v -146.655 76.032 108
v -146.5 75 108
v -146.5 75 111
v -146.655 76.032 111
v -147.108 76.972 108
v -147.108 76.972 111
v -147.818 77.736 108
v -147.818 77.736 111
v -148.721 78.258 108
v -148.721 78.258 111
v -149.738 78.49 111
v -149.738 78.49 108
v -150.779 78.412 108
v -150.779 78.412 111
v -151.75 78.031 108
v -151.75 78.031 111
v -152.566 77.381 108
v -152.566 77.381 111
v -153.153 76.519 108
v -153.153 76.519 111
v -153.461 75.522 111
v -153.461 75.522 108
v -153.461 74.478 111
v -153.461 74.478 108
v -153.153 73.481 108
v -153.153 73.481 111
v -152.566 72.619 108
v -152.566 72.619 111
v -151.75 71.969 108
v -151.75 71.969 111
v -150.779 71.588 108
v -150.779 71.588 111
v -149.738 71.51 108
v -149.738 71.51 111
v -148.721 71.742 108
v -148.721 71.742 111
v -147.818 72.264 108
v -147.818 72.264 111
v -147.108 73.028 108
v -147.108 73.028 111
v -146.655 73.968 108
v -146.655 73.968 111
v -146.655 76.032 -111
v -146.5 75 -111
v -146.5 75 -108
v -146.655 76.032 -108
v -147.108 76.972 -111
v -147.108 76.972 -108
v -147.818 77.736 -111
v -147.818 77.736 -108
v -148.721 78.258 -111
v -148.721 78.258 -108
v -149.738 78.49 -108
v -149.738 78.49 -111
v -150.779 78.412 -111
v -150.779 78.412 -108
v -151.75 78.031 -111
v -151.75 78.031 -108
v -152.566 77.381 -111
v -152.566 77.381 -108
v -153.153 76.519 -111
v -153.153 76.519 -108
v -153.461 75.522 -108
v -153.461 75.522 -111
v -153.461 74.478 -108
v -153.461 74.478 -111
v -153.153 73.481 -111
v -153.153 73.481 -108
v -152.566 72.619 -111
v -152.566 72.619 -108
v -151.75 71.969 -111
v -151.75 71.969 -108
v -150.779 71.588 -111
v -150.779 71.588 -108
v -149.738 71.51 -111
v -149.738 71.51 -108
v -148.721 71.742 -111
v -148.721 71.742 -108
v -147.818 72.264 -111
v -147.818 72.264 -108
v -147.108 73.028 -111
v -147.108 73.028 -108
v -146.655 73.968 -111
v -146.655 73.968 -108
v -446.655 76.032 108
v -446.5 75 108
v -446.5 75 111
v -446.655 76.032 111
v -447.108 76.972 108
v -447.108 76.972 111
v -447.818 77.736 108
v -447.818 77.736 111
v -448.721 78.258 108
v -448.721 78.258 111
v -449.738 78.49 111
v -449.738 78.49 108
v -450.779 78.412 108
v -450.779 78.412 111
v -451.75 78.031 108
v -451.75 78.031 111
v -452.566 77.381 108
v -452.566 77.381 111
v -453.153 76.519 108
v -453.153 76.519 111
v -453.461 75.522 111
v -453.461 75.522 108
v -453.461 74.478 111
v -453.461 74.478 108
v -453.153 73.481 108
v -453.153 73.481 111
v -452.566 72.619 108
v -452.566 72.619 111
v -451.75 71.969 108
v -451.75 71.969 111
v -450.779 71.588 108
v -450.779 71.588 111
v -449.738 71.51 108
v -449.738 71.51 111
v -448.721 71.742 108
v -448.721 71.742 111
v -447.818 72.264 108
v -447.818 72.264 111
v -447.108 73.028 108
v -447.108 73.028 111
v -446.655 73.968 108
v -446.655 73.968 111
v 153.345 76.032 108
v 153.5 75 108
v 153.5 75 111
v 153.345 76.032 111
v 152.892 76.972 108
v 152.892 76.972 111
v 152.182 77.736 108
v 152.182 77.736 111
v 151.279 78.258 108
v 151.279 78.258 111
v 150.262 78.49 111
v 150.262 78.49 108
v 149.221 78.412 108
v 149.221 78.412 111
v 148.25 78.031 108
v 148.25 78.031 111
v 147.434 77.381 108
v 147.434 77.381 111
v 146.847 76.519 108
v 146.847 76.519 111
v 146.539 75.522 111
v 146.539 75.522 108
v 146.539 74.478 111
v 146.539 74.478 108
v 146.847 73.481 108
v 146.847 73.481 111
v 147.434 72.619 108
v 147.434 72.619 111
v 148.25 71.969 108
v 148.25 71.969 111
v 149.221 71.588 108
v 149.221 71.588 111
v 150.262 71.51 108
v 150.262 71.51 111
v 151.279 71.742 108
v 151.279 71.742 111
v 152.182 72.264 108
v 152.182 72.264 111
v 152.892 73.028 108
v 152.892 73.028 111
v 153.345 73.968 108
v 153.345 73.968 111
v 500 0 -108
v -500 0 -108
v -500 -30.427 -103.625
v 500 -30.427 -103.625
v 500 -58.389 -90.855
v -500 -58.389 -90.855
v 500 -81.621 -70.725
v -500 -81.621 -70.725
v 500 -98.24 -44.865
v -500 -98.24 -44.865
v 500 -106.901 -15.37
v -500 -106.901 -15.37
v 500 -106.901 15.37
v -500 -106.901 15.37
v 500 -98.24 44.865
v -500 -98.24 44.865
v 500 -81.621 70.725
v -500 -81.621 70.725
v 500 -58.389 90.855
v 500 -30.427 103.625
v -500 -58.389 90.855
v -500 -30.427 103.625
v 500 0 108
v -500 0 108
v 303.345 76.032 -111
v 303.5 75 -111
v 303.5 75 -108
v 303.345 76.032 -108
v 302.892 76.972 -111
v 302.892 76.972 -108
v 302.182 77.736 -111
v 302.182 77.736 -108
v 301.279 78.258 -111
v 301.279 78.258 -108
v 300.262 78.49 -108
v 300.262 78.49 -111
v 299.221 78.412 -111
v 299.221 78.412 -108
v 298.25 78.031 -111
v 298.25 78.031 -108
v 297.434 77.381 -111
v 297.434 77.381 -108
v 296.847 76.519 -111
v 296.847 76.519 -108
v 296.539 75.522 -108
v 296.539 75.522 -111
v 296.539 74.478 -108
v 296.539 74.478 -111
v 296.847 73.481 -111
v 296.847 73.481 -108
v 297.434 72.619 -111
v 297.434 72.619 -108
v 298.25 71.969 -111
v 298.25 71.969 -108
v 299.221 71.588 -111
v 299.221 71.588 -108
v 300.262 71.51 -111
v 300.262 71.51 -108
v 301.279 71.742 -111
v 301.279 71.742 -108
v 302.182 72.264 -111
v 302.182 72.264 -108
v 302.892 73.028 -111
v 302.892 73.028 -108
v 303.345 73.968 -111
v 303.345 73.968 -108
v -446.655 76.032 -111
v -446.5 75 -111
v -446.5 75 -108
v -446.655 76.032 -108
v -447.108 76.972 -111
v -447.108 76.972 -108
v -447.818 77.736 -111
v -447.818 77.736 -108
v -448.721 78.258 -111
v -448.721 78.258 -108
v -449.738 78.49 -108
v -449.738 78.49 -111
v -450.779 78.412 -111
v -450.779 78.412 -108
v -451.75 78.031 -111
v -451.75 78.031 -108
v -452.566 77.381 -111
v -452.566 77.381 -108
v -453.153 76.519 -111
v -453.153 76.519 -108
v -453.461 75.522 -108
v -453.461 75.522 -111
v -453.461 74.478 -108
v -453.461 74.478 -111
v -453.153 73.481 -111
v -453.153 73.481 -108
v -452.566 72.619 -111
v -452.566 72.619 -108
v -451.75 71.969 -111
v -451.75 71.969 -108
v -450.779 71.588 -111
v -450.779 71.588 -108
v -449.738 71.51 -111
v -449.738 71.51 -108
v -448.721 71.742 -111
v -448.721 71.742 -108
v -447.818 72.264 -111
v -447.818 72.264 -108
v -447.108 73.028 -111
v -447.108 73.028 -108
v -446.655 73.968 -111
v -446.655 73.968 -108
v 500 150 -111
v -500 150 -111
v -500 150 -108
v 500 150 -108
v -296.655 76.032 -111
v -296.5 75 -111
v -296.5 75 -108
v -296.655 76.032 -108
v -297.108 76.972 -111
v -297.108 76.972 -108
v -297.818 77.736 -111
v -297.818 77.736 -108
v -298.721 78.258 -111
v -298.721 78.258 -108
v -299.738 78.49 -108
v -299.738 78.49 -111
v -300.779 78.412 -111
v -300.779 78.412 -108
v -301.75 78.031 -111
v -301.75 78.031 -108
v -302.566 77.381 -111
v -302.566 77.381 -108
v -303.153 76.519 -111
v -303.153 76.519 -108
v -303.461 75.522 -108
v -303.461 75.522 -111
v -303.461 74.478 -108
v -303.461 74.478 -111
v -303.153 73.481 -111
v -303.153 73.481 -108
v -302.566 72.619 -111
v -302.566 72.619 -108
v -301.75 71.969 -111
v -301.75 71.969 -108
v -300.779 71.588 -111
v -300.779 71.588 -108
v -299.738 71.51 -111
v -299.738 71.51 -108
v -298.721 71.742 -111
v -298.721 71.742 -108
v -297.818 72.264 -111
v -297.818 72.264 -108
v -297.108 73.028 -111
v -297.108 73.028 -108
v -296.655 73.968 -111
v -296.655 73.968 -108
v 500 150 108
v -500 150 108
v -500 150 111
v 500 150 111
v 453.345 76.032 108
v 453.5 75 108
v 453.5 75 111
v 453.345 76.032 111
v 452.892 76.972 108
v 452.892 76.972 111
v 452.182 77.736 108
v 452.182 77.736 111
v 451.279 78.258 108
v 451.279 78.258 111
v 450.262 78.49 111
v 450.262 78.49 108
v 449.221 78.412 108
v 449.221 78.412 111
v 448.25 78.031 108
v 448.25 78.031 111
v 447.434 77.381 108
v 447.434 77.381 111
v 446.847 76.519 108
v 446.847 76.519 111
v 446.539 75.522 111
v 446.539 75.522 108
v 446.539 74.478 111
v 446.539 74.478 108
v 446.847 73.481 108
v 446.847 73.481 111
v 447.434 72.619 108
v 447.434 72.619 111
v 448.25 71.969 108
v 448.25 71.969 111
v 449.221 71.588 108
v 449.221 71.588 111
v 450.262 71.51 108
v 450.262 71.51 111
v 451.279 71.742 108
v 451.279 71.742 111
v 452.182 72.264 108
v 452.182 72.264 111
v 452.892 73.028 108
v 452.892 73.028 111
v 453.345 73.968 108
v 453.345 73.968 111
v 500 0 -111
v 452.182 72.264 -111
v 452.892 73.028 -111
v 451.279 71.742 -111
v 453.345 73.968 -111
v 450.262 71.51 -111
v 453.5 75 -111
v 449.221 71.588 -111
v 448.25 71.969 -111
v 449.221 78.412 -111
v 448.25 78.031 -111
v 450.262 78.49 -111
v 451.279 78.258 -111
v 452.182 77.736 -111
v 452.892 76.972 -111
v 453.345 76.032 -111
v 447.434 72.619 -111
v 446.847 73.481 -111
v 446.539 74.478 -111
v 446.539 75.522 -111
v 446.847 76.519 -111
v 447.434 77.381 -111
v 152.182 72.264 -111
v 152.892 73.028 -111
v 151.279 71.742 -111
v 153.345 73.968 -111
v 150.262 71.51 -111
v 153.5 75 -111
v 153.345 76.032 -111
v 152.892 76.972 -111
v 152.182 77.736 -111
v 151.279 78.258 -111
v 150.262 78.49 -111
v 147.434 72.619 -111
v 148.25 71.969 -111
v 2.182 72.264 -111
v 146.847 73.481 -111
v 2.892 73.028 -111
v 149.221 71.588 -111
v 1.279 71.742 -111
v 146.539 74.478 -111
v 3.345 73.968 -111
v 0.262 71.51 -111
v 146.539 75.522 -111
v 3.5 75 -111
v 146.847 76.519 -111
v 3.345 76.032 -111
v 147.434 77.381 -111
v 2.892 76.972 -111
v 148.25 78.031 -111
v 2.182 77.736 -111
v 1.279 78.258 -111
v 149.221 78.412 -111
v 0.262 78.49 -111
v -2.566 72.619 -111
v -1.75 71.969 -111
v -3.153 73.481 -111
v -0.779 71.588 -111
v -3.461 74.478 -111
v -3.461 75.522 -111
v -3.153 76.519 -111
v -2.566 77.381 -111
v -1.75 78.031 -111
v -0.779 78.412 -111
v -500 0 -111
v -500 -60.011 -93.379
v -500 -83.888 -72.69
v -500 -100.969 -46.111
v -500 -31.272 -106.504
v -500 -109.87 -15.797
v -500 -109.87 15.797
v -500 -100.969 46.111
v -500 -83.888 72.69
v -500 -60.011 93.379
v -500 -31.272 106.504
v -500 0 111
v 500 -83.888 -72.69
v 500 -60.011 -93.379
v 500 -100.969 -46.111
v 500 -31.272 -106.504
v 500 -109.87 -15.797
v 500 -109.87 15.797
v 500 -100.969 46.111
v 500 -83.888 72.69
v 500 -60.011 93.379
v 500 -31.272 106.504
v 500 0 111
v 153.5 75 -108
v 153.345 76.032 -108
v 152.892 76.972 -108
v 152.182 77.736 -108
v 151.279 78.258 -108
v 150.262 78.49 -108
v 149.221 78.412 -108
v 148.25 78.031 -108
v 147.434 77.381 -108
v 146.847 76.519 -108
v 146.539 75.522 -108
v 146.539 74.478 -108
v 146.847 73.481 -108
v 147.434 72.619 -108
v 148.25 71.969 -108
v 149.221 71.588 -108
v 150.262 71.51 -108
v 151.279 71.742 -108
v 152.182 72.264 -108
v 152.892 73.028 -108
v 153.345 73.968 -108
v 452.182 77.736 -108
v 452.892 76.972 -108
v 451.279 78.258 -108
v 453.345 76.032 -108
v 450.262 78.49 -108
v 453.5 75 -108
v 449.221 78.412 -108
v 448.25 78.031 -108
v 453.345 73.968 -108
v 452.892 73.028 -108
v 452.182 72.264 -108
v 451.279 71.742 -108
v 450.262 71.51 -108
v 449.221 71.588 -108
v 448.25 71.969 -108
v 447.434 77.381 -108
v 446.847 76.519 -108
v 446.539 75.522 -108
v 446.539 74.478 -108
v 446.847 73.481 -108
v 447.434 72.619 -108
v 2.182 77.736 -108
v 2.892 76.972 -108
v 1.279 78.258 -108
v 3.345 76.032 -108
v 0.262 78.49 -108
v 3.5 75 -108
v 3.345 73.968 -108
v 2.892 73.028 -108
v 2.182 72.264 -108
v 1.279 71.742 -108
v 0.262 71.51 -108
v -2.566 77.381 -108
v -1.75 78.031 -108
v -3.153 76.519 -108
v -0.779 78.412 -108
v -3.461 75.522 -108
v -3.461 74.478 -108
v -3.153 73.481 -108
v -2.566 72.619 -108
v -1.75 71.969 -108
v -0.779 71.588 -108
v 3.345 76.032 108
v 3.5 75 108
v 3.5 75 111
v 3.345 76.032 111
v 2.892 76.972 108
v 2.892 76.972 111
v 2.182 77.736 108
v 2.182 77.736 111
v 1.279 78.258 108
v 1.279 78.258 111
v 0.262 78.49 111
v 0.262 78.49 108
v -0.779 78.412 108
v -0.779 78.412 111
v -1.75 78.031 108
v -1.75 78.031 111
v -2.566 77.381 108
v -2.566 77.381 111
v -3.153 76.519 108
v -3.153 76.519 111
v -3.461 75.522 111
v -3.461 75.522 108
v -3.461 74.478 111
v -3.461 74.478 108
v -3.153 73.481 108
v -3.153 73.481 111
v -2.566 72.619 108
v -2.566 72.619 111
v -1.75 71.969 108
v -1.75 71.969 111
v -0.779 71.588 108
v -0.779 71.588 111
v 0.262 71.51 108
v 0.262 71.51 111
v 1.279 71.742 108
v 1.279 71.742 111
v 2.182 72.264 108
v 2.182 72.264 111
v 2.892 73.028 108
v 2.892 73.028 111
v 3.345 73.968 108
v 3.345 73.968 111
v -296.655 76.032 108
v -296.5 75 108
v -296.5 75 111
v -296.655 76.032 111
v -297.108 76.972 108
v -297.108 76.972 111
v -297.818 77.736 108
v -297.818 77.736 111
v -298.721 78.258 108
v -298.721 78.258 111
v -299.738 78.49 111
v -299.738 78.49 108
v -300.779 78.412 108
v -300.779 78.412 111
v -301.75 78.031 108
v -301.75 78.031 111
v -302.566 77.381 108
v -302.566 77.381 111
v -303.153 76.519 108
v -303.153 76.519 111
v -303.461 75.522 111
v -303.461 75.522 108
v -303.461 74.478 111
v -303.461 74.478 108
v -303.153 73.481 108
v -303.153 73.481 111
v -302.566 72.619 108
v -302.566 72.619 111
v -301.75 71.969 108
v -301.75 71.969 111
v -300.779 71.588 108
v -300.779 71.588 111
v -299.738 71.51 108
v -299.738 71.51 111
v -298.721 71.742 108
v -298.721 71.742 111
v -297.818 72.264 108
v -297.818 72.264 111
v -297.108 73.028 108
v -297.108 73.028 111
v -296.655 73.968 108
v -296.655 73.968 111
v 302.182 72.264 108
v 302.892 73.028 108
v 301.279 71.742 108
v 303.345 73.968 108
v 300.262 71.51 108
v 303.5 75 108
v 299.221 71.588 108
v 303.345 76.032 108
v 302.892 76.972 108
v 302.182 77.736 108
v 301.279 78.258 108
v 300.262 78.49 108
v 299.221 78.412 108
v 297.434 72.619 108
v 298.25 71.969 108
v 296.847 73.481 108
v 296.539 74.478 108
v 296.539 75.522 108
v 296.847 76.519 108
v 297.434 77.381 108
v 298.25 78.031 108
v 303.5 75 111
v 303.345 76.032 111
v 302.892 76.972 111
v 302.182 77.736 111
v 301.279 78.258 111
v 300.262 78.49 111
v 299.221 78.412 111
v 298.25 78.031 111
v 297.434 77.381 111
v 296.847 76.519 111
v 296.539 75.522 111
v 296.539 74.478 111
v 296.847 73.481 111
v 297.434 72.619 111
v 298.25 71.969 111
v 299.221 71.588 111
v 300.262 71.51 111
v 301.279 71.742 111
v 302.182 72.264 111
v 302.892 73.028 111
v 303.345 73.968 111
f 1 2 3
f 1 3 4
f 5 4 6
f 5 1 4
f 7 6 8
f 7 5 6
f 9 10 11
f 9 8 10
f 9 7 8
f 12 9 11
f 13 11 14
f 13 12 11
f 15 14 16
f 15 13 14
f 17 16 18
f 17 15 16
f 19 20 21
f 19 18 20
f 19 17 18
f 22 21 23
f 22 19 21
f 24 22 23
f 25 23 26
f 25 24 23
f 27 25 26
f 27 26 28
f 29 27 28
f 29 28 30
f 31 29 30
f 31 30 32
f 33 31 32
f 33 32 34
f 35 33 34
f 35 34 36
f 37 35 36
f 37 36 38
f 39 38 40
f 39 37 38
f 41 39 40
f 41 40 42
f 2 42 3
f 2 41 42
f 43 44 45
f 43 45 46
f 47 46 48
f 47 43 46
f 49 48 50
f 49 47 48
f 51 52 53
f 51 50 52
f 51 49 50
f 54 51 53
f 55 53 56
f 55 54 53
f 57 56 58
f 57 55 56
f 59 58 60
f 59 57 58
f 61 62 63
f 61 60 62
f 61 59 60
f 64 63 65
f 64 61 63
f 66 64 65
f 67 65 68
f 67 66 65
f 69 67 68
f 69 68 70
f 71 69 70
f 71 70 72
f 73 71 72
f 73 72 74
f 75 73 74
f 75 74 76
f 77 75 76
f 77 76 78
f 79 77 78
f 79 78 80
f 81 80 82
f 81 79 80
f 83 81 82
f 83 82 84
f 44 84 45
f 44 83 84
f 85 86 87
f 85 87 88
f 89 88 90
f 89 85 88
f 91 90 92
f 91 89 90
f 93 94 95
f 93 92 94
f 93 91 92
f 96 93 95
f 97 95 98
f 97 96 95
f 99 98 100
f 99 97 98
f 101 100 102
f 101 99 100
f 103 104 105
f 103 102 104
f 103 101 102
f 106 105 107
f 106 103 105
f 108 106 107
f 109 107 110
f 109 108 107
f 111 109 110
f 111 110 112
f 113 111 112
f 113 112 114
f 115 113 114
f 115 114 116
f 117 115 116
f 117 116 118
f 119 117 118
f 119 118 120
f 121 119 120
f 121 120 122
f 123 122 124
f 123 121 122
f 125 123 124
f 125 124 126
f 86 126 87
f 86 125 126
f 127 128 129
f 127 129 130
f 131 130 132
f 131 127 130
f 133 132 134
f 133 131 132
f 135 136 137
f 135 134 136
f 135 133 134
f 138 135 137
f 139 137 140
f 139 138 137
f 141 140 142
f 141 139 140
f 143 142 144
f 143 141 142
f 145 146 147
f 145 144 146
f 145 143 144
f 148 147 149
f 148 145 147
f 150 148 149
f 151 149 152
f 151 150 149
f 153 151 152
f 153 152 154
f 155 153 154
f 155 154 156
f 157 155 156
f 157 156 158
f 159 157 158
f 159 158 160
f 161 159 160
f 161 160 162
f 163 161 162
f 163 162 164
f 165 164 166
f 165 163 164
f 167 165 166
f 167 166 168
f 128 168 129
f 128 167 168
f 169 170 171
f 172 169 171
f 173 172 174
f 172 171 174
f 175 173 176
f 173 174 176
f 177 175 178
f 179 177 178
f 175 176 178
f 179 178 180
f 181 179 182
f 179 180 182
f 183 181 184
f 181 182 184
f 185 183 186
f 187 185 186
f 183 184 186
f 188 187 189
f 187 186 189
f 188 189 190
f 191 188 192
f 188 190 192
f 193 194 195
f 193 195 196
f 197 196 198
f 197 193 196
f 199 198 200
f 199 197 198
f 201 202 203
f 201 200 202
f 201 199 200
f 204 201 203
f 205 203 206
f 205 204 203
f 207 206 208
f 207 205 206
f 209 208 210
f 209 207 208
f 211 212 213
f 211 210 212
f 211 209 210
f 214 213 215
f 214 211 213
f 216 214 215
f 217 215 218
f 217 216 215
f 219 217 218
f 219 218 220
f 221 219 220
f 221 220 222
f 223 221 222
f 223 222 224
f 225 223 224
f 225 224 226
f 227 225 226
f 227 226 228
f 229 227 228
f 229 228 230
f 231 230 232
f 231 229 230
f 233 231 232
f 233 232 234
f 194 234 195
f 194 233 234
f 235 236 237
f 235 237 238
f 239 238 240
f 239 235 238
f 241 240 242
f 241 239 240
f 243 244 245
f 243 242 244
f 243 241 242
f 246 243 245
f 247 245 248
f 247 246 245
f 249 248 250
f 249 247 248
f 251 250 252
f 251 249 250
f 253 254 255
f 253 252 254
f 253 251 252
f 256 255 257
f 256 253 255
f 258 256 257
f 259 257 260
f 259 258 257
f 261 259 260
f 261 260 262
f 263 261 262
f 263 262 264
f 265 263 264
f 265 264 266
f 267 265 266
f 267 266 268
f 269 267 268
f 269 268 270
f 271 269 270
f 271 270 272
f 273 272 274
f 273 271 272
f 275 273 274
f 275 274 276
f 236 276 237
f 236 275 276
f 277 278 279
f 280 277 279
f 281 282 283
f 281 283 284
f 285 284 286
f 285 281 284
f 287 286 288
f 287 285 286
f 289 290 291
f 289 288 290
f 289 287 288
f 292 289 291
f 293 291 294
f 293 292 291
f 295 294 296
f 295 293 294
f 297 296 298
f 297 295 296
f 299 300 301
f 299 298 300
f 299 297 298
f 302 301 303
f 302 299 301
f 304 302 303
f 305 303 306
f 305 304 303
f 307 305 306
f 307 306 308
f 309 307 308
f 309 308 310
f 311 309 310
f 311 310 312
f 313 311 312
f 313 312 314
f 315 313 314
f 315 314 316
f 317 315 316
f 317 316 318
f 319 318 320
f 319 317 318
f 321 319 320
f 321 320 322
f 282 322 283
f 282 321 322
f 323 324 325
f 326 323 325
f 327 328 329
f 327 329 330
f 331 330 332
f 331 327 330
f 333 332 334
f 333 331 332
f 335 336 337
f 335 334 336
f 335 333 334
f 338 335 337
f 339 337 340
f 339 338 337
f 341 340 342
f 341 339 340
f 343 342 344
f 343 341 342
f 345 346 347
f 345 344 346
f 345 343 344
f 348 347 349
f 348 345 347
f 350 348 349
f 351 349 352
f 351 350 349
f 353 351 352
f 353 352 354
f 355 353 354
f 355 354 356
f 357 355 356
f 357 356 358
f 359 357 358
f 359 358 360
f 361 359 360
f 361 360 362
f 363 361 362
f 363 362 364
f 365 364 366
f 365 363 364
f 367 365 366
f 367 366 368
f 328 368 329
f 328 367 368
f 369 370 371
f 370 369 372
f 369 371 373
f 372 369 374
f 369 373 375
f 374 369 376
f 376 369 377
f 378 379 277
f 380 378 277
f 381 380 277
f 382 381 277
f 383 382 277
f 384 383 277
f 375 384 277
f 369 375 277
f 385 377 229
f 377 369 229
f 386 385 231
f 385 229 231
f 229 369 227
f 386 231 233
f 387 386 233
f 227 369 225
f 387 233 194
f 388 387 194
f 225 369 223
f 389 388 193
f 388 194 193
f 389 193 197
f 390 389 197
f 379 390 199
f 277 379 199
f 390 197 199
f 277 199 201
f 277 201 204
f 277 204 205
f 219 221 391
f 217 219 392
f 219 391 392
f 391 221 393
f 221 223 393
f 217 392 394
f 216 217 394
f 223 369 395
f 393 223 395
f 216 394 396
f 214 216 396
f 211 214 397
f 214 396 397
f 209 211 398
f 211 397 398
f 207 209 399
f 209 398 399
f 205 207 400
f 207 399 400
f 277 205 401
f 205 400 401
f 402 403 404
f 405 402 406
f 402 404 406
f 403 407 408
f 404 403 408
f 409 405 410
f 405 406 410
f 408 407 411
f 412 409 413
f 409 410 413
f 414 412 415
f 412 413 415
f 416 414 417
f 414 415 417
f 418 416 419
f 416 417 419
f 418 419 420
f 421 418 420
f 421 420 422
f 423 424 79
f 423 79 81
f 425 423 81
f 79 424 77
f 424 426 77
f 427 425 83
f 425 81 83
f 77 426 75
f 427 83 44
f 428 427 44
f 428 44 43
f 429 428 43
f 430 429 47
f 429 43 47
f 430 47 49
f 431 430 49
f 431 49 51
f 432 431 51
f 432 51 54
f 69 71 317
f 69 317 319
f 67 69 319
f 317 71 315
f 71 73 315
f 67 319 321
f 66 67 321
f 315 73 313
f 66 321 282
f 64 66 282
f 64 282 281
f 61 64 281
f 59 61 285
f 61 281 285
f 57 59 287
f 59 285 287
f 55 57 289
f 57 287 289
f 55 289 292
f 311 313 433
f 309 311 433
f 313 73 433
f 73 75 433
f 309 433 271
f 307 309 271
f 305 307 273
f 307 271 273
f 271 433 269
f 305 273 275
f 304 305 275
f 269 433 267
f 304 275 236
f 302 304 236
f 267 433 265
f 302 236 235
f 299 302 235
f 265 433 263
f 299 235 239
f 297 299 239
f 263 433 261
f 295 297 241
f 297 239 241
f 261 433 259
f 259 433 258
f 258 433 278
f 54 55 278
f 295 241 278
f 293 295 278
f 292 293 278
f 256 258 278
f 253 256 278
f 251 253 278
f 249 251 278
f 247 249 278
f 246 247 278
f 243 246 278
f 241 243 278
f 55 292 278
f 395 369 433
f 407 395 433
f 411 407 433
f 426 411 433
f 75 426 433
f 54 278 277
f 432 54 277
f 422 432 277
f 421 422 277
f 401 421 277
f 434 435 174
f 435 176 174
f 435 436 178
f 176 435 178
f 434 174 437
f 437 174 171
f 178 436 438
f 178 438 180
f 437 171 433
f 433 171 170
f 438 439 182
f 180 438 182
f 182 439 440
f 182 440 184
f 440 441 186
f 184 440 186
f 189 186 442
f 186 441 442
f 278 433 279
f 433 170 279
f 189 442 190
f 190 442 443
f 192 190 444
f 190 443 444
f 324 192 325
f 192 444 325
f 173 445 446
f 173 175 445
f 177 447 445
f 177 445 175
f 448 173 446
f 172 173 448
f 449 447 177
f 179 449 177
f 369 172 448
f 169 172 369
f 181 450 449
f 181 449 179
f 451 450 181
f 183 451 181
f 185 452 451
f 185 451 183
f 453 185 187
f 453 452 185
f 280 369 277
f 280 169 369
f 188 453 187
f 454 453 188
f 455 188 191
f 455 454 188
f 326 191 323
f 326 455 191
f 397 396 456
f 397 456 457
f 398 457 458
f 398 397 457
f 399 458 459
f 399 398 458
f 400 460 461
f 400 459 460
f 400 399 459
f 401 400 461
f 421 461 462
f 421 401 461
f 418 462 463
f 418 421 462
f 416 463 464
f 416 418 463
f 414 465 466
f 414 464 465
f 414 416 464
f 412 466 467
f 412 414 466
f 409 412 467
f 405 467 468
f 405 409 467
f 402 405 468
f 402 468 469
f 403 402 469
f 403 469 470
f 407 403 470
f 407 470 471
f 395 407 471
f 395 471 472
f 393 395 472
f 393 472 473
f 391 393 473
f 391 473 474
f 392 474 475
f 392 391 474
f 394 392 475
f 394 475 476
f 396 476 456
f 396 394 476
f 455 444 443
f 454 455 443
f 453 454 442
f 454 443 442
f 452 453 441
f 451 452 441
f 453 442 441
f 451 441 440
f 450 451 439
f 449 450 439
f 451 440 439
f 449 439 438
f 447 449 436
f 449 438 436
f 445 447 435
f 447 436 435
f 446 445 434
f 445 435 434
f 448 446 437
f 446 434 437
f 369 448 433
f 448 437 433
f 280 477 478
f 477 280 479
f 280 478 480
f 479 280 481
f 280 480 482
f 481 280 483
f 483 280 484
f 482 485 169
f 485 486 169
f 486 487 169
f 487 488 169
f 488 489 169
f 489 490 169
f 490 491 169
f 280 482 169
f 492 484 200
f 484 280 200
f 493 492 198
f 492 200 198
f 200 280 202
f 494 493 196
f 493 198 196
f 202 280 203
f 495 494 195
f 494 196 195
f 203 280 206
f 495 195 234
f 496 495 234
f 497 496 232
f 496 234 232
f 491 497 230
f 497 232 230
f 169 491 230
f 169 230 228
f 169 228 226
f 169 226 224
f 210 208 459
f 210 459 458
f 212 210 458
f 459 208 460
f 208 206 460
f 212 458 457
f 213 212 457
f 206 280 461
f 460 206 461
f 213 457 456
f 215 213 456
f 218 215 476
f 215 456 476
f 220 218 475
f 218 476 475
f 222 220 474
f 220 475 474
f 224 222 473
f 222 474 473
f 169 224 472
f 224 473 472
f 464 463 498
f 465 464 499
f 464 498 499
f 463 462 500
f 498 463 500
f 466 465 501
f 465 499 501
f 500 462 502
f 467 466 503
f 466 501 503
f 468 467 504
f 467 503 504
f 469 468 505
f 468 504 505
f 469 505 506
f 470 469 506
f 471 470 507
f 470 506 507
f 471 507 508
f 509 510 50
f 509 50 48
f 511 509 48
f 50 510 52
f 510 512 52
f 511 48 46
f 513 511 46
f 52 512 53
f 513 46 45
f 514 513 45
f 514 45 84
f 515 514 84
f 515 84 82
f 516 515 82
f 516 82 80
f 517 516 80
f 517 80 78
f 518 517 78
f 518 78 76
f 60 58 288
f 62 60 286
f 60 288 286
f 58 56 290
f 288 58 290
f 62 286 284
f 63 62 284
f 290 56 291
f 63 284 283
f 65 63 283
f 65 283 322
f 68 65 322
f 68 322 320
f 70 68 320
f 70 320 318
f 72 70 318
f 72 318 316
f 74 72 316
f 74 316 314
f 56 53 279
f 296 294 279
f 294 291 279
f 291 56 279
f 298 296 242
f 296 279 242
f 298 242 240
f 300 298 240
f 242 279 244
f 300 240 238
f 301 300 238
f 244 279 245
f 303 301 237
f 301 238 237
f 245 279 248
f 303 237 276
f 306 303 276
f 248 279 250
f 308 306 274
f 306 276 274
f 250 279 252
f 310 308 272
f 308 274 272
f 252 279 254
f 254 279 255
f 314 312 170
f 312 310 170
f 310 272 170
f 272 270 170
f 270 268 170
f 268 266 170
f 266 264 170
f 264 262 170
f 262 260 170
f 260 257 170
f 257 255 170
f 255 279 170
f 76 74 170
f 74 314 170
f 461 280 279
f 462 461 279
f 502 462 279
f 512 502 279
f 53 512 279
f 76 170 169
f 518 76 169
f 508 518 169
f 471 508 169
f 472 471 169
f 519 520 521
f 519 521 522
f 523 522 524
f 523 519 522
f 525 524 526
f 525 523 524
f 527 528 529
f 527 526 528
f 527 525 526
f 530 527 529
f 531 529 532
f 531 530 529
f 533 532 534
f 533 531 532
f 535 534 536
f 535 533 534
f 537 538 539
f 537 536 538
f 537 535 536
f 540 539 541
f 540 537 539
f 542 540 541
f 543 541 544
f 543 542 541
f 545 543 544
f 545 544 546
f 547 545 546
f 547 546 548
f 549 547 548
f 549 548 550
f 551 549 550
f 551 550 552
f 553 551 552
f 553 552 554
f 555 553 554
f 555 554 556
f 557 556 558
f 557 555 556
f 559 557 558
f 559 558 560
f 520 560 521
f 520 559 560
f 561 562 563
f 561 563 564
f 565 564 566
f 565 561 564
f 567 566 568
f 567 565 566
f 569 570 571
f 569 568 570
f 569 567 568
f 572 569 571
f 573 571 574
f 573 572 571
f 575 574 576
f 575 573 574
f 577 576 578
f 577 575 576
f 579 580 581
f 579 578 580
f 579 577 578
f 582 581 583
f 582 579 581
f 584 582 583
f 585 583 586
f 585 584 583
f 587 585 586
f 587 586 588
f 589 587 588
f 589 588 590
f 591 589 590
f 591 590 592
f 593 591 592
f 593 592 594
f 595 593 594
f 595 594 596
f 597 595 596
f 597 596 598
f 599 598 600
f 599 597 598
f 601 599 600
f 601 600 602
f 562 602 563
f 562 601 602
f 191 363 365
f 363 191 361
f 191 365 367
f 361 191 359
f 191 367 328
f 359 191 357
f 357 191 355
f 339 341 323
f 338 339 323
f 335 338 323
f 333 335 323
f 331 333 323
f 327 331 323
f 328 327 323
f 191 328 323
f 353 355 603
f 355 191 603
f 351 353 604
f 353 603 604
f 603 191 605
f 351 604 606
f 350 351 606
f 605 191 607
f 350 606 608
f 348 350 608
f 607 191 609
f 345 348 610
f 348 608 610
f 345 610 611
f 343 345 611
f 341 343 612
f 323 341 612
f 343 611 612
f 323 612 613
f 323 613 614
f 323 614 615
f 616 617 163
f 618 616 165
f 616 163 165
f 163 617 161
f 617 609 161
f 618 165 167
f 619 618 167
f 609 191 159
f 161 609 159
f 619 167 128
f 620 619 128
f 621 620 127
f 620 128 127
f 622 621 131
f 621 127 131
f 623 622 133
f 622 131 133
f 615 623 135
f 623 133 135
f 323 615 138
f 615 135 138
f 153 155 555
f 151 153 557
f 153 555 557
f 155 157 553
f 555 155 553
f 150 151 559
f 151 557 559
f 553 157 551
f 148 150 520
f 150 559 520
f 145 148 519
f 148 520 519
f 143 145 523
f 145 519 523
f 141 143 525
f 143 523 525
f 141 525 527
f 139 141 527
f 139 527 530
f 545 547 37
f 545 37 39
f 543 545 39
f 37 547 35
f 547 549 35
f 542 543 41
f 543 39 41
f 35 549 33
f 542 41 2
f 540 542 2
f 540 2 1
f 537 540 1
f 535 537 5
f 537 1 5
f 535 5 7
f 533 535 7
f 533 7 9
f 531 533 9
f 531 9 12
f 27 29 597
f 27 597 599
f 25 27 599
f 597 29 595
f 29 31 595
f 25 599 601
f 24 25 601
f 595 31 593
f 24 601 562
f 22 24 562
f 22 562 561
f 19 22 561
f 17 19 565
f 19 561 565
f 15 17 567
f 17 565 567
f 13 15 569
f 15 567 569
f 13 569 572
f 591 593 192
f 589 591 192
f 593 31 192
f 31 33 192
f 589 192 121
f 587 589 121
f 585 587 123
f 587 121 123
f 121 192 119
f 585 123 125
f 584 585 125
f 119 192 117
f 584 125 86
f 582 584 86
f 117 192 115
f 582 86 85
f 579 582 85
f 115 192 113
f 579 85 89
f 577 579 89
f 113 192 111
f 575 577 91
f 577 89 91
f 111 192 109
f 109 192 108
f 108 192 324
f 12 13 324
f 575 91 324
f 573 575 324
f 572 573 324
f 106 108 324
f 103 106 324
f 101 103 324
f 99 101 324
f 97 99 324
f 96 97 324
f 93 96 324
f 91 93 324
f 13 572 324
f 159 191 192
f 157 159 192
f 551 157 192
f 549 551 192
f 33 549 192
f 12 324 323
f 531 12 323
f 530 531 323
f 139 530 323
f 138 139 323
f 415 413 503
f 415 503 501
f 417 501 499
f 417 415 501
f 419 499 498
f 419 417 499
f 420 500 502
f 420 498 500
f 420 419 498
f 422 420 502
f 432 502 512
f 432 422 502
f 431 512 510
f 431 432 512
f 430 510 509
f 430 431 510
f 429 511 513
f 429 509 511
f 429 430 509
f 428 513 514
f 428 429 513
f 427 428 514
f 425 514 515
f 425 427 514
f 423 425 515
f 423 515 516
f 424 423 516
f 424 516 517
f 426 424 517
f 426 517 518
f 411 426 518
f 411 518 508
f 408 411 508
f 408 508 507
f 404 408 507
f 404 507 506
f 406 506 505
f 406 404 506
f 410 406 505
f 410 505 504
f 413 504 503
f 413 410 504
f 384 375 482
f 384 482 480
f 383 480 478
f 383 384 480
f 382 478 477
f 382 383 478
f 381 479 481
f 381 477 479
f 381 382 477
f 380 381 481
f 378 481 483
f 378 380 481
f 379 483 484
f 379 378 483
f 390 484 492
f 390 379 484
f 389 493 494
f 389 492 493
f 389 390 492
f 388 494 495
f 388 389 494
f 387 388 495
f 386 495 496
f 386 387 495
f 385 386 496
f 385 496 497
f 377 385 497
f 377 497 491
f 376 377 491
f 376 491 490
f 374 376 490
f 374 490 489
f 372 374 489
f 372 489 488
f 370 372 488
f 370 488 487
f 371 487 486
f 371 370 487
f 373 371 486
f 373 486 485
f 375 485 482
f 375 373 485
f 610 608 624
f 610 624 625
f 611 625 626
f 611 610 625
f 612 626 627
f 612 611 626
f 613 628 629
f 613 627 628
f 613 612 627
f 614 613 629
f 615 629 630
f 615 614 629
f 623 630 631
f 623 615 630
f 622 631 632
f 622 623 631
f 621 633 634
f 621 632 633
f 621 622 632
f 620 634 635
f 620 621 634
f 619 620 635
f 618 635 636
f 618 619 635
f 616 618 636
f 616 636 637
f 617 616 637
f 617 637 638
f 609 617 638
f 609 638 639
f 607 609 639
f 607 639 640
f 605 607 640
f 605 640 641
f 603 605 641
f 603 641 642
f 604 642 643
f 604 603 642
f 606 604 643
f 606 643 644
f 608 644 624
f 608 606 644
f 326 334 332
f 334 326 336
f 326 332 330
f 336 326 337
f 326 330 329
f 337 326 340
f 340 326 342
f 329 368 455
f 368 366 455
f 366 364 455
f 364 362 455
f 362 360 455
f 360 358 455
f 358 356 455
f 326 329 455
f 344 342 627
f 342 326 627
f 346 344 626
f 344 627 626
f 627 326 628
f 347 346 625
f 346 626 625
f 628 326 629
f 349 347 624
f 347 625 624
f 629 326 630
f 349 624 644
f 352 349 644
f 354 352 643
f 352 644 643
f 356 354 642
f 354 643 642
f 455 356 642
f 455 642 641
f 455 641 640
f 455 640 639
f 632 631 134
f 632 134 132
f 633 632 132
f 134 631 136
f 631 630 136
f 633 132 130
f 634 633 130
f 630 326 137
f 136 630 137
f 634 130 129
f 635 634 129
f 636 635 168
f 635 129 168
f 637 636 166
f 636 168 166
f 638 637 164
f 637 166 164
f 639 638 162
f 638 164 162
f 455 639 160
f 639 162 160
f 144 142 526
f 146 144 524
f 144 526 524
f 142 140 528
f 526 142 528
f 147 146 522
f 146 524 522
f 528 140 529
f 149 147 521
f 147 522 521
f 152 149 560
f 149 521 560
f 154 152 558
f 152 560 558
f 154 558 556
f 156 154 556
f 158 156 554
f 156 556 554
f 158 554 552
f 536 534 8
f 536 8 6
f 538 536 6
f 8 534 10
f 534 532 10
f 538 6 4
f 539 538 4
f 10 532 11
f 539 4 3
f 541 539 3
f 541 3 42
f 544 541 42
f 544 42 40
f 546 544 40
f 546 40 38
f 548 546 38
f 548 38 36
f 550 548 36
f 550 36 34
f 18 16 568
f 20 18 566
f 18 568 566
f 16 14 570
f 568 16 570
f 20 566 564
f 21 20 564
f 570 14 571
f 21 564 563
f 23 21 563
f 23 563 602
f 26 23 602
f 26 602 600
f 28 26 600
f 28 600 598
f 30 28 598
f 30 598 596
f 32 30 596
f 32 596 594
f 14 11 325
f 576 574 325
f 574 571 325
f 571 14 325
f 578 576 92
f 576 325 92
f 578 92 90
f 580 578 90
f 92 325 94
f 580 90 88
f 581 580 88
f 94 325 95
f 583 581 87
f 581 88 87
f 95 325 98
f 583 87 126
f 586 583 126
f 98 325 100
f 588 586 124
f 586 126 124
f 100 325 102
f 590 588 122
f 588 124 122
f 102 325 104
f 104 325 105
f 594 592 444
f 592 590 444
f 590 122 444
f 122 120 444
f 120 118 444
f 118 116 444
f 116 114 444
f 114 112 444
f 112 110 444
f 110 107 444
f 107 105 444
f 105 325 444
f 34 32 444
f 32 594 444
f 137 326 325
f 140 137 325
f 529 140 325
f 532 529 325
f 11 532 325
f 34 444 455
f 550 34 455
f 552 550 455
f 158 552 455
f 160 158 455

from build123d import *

# Parameters (mm, degrees)
OTHER_START              = -500
OTHER_2_DEPTH            = 1000
CUT_EXTRUDE_3_DEPTH      = 534.686237409
CUT_EXTRUDE_3_DEPTH_BACK = 534.686237409
SKETCH_11_R              = 3.5


# Read off the part's stored shape, not the designer's step: Элемент по сечениям сгиба2
with BuildPart() as part:
    # Other 2 outline → Other 2 (new body)
    with BuildSketch(Plane.YZ.offset(OTHER_START)):
        with BuildLine():
            Line((0, -111), (150, -111))
            Line((150, -111), (150, -108))
            Line((150, -108), (0, -108))
            ThreePointArc((0, -108), (-108, 0), (0, 108))
            Line((0, 108), (150, 108))
            Line((150, 108), (150, 111))
            Line((150, 111), (0, 111))
            ThreePointArc((0, 111), (-111, 0), (0, -111))
        make_face()
    extrude(amount=OTHER_2_DEPTH)

    # Эскиз11 → Вырез-Вытянуть3 (cut, two sides: drawn at the far end of the back side and taken through both)
    with BuildSketch(Plane.XY.offset(-CUT_EXTRUDE_3_DEPTH_BACK)):
        with Locations((450, 75)):
            Circle(SKETCH_11_R)
        with Locations((300, 75)):
            Circle(SKETCH_11_R)
        with Locations((150, 75)):
            Circle(SKETCH_11_R)
        with Locations((0, 75)):
            Circle(SKETCH_11_R)
        with Locations((-150, 75)):
            Circle(SKETCH_11_R)
        with Locations((-300, 75)):
            Circle(SKETCH_11_R)
        with Locations((-450, 75)):
            Circle(SKETCH_11_R)
    extrude(amount=CUT_EXTRUDE_3_DEPTH + CUT_EXTRUDE_3_DEPTH_BACK, mode=Mode.SUBTRACT)


solid = part.part
